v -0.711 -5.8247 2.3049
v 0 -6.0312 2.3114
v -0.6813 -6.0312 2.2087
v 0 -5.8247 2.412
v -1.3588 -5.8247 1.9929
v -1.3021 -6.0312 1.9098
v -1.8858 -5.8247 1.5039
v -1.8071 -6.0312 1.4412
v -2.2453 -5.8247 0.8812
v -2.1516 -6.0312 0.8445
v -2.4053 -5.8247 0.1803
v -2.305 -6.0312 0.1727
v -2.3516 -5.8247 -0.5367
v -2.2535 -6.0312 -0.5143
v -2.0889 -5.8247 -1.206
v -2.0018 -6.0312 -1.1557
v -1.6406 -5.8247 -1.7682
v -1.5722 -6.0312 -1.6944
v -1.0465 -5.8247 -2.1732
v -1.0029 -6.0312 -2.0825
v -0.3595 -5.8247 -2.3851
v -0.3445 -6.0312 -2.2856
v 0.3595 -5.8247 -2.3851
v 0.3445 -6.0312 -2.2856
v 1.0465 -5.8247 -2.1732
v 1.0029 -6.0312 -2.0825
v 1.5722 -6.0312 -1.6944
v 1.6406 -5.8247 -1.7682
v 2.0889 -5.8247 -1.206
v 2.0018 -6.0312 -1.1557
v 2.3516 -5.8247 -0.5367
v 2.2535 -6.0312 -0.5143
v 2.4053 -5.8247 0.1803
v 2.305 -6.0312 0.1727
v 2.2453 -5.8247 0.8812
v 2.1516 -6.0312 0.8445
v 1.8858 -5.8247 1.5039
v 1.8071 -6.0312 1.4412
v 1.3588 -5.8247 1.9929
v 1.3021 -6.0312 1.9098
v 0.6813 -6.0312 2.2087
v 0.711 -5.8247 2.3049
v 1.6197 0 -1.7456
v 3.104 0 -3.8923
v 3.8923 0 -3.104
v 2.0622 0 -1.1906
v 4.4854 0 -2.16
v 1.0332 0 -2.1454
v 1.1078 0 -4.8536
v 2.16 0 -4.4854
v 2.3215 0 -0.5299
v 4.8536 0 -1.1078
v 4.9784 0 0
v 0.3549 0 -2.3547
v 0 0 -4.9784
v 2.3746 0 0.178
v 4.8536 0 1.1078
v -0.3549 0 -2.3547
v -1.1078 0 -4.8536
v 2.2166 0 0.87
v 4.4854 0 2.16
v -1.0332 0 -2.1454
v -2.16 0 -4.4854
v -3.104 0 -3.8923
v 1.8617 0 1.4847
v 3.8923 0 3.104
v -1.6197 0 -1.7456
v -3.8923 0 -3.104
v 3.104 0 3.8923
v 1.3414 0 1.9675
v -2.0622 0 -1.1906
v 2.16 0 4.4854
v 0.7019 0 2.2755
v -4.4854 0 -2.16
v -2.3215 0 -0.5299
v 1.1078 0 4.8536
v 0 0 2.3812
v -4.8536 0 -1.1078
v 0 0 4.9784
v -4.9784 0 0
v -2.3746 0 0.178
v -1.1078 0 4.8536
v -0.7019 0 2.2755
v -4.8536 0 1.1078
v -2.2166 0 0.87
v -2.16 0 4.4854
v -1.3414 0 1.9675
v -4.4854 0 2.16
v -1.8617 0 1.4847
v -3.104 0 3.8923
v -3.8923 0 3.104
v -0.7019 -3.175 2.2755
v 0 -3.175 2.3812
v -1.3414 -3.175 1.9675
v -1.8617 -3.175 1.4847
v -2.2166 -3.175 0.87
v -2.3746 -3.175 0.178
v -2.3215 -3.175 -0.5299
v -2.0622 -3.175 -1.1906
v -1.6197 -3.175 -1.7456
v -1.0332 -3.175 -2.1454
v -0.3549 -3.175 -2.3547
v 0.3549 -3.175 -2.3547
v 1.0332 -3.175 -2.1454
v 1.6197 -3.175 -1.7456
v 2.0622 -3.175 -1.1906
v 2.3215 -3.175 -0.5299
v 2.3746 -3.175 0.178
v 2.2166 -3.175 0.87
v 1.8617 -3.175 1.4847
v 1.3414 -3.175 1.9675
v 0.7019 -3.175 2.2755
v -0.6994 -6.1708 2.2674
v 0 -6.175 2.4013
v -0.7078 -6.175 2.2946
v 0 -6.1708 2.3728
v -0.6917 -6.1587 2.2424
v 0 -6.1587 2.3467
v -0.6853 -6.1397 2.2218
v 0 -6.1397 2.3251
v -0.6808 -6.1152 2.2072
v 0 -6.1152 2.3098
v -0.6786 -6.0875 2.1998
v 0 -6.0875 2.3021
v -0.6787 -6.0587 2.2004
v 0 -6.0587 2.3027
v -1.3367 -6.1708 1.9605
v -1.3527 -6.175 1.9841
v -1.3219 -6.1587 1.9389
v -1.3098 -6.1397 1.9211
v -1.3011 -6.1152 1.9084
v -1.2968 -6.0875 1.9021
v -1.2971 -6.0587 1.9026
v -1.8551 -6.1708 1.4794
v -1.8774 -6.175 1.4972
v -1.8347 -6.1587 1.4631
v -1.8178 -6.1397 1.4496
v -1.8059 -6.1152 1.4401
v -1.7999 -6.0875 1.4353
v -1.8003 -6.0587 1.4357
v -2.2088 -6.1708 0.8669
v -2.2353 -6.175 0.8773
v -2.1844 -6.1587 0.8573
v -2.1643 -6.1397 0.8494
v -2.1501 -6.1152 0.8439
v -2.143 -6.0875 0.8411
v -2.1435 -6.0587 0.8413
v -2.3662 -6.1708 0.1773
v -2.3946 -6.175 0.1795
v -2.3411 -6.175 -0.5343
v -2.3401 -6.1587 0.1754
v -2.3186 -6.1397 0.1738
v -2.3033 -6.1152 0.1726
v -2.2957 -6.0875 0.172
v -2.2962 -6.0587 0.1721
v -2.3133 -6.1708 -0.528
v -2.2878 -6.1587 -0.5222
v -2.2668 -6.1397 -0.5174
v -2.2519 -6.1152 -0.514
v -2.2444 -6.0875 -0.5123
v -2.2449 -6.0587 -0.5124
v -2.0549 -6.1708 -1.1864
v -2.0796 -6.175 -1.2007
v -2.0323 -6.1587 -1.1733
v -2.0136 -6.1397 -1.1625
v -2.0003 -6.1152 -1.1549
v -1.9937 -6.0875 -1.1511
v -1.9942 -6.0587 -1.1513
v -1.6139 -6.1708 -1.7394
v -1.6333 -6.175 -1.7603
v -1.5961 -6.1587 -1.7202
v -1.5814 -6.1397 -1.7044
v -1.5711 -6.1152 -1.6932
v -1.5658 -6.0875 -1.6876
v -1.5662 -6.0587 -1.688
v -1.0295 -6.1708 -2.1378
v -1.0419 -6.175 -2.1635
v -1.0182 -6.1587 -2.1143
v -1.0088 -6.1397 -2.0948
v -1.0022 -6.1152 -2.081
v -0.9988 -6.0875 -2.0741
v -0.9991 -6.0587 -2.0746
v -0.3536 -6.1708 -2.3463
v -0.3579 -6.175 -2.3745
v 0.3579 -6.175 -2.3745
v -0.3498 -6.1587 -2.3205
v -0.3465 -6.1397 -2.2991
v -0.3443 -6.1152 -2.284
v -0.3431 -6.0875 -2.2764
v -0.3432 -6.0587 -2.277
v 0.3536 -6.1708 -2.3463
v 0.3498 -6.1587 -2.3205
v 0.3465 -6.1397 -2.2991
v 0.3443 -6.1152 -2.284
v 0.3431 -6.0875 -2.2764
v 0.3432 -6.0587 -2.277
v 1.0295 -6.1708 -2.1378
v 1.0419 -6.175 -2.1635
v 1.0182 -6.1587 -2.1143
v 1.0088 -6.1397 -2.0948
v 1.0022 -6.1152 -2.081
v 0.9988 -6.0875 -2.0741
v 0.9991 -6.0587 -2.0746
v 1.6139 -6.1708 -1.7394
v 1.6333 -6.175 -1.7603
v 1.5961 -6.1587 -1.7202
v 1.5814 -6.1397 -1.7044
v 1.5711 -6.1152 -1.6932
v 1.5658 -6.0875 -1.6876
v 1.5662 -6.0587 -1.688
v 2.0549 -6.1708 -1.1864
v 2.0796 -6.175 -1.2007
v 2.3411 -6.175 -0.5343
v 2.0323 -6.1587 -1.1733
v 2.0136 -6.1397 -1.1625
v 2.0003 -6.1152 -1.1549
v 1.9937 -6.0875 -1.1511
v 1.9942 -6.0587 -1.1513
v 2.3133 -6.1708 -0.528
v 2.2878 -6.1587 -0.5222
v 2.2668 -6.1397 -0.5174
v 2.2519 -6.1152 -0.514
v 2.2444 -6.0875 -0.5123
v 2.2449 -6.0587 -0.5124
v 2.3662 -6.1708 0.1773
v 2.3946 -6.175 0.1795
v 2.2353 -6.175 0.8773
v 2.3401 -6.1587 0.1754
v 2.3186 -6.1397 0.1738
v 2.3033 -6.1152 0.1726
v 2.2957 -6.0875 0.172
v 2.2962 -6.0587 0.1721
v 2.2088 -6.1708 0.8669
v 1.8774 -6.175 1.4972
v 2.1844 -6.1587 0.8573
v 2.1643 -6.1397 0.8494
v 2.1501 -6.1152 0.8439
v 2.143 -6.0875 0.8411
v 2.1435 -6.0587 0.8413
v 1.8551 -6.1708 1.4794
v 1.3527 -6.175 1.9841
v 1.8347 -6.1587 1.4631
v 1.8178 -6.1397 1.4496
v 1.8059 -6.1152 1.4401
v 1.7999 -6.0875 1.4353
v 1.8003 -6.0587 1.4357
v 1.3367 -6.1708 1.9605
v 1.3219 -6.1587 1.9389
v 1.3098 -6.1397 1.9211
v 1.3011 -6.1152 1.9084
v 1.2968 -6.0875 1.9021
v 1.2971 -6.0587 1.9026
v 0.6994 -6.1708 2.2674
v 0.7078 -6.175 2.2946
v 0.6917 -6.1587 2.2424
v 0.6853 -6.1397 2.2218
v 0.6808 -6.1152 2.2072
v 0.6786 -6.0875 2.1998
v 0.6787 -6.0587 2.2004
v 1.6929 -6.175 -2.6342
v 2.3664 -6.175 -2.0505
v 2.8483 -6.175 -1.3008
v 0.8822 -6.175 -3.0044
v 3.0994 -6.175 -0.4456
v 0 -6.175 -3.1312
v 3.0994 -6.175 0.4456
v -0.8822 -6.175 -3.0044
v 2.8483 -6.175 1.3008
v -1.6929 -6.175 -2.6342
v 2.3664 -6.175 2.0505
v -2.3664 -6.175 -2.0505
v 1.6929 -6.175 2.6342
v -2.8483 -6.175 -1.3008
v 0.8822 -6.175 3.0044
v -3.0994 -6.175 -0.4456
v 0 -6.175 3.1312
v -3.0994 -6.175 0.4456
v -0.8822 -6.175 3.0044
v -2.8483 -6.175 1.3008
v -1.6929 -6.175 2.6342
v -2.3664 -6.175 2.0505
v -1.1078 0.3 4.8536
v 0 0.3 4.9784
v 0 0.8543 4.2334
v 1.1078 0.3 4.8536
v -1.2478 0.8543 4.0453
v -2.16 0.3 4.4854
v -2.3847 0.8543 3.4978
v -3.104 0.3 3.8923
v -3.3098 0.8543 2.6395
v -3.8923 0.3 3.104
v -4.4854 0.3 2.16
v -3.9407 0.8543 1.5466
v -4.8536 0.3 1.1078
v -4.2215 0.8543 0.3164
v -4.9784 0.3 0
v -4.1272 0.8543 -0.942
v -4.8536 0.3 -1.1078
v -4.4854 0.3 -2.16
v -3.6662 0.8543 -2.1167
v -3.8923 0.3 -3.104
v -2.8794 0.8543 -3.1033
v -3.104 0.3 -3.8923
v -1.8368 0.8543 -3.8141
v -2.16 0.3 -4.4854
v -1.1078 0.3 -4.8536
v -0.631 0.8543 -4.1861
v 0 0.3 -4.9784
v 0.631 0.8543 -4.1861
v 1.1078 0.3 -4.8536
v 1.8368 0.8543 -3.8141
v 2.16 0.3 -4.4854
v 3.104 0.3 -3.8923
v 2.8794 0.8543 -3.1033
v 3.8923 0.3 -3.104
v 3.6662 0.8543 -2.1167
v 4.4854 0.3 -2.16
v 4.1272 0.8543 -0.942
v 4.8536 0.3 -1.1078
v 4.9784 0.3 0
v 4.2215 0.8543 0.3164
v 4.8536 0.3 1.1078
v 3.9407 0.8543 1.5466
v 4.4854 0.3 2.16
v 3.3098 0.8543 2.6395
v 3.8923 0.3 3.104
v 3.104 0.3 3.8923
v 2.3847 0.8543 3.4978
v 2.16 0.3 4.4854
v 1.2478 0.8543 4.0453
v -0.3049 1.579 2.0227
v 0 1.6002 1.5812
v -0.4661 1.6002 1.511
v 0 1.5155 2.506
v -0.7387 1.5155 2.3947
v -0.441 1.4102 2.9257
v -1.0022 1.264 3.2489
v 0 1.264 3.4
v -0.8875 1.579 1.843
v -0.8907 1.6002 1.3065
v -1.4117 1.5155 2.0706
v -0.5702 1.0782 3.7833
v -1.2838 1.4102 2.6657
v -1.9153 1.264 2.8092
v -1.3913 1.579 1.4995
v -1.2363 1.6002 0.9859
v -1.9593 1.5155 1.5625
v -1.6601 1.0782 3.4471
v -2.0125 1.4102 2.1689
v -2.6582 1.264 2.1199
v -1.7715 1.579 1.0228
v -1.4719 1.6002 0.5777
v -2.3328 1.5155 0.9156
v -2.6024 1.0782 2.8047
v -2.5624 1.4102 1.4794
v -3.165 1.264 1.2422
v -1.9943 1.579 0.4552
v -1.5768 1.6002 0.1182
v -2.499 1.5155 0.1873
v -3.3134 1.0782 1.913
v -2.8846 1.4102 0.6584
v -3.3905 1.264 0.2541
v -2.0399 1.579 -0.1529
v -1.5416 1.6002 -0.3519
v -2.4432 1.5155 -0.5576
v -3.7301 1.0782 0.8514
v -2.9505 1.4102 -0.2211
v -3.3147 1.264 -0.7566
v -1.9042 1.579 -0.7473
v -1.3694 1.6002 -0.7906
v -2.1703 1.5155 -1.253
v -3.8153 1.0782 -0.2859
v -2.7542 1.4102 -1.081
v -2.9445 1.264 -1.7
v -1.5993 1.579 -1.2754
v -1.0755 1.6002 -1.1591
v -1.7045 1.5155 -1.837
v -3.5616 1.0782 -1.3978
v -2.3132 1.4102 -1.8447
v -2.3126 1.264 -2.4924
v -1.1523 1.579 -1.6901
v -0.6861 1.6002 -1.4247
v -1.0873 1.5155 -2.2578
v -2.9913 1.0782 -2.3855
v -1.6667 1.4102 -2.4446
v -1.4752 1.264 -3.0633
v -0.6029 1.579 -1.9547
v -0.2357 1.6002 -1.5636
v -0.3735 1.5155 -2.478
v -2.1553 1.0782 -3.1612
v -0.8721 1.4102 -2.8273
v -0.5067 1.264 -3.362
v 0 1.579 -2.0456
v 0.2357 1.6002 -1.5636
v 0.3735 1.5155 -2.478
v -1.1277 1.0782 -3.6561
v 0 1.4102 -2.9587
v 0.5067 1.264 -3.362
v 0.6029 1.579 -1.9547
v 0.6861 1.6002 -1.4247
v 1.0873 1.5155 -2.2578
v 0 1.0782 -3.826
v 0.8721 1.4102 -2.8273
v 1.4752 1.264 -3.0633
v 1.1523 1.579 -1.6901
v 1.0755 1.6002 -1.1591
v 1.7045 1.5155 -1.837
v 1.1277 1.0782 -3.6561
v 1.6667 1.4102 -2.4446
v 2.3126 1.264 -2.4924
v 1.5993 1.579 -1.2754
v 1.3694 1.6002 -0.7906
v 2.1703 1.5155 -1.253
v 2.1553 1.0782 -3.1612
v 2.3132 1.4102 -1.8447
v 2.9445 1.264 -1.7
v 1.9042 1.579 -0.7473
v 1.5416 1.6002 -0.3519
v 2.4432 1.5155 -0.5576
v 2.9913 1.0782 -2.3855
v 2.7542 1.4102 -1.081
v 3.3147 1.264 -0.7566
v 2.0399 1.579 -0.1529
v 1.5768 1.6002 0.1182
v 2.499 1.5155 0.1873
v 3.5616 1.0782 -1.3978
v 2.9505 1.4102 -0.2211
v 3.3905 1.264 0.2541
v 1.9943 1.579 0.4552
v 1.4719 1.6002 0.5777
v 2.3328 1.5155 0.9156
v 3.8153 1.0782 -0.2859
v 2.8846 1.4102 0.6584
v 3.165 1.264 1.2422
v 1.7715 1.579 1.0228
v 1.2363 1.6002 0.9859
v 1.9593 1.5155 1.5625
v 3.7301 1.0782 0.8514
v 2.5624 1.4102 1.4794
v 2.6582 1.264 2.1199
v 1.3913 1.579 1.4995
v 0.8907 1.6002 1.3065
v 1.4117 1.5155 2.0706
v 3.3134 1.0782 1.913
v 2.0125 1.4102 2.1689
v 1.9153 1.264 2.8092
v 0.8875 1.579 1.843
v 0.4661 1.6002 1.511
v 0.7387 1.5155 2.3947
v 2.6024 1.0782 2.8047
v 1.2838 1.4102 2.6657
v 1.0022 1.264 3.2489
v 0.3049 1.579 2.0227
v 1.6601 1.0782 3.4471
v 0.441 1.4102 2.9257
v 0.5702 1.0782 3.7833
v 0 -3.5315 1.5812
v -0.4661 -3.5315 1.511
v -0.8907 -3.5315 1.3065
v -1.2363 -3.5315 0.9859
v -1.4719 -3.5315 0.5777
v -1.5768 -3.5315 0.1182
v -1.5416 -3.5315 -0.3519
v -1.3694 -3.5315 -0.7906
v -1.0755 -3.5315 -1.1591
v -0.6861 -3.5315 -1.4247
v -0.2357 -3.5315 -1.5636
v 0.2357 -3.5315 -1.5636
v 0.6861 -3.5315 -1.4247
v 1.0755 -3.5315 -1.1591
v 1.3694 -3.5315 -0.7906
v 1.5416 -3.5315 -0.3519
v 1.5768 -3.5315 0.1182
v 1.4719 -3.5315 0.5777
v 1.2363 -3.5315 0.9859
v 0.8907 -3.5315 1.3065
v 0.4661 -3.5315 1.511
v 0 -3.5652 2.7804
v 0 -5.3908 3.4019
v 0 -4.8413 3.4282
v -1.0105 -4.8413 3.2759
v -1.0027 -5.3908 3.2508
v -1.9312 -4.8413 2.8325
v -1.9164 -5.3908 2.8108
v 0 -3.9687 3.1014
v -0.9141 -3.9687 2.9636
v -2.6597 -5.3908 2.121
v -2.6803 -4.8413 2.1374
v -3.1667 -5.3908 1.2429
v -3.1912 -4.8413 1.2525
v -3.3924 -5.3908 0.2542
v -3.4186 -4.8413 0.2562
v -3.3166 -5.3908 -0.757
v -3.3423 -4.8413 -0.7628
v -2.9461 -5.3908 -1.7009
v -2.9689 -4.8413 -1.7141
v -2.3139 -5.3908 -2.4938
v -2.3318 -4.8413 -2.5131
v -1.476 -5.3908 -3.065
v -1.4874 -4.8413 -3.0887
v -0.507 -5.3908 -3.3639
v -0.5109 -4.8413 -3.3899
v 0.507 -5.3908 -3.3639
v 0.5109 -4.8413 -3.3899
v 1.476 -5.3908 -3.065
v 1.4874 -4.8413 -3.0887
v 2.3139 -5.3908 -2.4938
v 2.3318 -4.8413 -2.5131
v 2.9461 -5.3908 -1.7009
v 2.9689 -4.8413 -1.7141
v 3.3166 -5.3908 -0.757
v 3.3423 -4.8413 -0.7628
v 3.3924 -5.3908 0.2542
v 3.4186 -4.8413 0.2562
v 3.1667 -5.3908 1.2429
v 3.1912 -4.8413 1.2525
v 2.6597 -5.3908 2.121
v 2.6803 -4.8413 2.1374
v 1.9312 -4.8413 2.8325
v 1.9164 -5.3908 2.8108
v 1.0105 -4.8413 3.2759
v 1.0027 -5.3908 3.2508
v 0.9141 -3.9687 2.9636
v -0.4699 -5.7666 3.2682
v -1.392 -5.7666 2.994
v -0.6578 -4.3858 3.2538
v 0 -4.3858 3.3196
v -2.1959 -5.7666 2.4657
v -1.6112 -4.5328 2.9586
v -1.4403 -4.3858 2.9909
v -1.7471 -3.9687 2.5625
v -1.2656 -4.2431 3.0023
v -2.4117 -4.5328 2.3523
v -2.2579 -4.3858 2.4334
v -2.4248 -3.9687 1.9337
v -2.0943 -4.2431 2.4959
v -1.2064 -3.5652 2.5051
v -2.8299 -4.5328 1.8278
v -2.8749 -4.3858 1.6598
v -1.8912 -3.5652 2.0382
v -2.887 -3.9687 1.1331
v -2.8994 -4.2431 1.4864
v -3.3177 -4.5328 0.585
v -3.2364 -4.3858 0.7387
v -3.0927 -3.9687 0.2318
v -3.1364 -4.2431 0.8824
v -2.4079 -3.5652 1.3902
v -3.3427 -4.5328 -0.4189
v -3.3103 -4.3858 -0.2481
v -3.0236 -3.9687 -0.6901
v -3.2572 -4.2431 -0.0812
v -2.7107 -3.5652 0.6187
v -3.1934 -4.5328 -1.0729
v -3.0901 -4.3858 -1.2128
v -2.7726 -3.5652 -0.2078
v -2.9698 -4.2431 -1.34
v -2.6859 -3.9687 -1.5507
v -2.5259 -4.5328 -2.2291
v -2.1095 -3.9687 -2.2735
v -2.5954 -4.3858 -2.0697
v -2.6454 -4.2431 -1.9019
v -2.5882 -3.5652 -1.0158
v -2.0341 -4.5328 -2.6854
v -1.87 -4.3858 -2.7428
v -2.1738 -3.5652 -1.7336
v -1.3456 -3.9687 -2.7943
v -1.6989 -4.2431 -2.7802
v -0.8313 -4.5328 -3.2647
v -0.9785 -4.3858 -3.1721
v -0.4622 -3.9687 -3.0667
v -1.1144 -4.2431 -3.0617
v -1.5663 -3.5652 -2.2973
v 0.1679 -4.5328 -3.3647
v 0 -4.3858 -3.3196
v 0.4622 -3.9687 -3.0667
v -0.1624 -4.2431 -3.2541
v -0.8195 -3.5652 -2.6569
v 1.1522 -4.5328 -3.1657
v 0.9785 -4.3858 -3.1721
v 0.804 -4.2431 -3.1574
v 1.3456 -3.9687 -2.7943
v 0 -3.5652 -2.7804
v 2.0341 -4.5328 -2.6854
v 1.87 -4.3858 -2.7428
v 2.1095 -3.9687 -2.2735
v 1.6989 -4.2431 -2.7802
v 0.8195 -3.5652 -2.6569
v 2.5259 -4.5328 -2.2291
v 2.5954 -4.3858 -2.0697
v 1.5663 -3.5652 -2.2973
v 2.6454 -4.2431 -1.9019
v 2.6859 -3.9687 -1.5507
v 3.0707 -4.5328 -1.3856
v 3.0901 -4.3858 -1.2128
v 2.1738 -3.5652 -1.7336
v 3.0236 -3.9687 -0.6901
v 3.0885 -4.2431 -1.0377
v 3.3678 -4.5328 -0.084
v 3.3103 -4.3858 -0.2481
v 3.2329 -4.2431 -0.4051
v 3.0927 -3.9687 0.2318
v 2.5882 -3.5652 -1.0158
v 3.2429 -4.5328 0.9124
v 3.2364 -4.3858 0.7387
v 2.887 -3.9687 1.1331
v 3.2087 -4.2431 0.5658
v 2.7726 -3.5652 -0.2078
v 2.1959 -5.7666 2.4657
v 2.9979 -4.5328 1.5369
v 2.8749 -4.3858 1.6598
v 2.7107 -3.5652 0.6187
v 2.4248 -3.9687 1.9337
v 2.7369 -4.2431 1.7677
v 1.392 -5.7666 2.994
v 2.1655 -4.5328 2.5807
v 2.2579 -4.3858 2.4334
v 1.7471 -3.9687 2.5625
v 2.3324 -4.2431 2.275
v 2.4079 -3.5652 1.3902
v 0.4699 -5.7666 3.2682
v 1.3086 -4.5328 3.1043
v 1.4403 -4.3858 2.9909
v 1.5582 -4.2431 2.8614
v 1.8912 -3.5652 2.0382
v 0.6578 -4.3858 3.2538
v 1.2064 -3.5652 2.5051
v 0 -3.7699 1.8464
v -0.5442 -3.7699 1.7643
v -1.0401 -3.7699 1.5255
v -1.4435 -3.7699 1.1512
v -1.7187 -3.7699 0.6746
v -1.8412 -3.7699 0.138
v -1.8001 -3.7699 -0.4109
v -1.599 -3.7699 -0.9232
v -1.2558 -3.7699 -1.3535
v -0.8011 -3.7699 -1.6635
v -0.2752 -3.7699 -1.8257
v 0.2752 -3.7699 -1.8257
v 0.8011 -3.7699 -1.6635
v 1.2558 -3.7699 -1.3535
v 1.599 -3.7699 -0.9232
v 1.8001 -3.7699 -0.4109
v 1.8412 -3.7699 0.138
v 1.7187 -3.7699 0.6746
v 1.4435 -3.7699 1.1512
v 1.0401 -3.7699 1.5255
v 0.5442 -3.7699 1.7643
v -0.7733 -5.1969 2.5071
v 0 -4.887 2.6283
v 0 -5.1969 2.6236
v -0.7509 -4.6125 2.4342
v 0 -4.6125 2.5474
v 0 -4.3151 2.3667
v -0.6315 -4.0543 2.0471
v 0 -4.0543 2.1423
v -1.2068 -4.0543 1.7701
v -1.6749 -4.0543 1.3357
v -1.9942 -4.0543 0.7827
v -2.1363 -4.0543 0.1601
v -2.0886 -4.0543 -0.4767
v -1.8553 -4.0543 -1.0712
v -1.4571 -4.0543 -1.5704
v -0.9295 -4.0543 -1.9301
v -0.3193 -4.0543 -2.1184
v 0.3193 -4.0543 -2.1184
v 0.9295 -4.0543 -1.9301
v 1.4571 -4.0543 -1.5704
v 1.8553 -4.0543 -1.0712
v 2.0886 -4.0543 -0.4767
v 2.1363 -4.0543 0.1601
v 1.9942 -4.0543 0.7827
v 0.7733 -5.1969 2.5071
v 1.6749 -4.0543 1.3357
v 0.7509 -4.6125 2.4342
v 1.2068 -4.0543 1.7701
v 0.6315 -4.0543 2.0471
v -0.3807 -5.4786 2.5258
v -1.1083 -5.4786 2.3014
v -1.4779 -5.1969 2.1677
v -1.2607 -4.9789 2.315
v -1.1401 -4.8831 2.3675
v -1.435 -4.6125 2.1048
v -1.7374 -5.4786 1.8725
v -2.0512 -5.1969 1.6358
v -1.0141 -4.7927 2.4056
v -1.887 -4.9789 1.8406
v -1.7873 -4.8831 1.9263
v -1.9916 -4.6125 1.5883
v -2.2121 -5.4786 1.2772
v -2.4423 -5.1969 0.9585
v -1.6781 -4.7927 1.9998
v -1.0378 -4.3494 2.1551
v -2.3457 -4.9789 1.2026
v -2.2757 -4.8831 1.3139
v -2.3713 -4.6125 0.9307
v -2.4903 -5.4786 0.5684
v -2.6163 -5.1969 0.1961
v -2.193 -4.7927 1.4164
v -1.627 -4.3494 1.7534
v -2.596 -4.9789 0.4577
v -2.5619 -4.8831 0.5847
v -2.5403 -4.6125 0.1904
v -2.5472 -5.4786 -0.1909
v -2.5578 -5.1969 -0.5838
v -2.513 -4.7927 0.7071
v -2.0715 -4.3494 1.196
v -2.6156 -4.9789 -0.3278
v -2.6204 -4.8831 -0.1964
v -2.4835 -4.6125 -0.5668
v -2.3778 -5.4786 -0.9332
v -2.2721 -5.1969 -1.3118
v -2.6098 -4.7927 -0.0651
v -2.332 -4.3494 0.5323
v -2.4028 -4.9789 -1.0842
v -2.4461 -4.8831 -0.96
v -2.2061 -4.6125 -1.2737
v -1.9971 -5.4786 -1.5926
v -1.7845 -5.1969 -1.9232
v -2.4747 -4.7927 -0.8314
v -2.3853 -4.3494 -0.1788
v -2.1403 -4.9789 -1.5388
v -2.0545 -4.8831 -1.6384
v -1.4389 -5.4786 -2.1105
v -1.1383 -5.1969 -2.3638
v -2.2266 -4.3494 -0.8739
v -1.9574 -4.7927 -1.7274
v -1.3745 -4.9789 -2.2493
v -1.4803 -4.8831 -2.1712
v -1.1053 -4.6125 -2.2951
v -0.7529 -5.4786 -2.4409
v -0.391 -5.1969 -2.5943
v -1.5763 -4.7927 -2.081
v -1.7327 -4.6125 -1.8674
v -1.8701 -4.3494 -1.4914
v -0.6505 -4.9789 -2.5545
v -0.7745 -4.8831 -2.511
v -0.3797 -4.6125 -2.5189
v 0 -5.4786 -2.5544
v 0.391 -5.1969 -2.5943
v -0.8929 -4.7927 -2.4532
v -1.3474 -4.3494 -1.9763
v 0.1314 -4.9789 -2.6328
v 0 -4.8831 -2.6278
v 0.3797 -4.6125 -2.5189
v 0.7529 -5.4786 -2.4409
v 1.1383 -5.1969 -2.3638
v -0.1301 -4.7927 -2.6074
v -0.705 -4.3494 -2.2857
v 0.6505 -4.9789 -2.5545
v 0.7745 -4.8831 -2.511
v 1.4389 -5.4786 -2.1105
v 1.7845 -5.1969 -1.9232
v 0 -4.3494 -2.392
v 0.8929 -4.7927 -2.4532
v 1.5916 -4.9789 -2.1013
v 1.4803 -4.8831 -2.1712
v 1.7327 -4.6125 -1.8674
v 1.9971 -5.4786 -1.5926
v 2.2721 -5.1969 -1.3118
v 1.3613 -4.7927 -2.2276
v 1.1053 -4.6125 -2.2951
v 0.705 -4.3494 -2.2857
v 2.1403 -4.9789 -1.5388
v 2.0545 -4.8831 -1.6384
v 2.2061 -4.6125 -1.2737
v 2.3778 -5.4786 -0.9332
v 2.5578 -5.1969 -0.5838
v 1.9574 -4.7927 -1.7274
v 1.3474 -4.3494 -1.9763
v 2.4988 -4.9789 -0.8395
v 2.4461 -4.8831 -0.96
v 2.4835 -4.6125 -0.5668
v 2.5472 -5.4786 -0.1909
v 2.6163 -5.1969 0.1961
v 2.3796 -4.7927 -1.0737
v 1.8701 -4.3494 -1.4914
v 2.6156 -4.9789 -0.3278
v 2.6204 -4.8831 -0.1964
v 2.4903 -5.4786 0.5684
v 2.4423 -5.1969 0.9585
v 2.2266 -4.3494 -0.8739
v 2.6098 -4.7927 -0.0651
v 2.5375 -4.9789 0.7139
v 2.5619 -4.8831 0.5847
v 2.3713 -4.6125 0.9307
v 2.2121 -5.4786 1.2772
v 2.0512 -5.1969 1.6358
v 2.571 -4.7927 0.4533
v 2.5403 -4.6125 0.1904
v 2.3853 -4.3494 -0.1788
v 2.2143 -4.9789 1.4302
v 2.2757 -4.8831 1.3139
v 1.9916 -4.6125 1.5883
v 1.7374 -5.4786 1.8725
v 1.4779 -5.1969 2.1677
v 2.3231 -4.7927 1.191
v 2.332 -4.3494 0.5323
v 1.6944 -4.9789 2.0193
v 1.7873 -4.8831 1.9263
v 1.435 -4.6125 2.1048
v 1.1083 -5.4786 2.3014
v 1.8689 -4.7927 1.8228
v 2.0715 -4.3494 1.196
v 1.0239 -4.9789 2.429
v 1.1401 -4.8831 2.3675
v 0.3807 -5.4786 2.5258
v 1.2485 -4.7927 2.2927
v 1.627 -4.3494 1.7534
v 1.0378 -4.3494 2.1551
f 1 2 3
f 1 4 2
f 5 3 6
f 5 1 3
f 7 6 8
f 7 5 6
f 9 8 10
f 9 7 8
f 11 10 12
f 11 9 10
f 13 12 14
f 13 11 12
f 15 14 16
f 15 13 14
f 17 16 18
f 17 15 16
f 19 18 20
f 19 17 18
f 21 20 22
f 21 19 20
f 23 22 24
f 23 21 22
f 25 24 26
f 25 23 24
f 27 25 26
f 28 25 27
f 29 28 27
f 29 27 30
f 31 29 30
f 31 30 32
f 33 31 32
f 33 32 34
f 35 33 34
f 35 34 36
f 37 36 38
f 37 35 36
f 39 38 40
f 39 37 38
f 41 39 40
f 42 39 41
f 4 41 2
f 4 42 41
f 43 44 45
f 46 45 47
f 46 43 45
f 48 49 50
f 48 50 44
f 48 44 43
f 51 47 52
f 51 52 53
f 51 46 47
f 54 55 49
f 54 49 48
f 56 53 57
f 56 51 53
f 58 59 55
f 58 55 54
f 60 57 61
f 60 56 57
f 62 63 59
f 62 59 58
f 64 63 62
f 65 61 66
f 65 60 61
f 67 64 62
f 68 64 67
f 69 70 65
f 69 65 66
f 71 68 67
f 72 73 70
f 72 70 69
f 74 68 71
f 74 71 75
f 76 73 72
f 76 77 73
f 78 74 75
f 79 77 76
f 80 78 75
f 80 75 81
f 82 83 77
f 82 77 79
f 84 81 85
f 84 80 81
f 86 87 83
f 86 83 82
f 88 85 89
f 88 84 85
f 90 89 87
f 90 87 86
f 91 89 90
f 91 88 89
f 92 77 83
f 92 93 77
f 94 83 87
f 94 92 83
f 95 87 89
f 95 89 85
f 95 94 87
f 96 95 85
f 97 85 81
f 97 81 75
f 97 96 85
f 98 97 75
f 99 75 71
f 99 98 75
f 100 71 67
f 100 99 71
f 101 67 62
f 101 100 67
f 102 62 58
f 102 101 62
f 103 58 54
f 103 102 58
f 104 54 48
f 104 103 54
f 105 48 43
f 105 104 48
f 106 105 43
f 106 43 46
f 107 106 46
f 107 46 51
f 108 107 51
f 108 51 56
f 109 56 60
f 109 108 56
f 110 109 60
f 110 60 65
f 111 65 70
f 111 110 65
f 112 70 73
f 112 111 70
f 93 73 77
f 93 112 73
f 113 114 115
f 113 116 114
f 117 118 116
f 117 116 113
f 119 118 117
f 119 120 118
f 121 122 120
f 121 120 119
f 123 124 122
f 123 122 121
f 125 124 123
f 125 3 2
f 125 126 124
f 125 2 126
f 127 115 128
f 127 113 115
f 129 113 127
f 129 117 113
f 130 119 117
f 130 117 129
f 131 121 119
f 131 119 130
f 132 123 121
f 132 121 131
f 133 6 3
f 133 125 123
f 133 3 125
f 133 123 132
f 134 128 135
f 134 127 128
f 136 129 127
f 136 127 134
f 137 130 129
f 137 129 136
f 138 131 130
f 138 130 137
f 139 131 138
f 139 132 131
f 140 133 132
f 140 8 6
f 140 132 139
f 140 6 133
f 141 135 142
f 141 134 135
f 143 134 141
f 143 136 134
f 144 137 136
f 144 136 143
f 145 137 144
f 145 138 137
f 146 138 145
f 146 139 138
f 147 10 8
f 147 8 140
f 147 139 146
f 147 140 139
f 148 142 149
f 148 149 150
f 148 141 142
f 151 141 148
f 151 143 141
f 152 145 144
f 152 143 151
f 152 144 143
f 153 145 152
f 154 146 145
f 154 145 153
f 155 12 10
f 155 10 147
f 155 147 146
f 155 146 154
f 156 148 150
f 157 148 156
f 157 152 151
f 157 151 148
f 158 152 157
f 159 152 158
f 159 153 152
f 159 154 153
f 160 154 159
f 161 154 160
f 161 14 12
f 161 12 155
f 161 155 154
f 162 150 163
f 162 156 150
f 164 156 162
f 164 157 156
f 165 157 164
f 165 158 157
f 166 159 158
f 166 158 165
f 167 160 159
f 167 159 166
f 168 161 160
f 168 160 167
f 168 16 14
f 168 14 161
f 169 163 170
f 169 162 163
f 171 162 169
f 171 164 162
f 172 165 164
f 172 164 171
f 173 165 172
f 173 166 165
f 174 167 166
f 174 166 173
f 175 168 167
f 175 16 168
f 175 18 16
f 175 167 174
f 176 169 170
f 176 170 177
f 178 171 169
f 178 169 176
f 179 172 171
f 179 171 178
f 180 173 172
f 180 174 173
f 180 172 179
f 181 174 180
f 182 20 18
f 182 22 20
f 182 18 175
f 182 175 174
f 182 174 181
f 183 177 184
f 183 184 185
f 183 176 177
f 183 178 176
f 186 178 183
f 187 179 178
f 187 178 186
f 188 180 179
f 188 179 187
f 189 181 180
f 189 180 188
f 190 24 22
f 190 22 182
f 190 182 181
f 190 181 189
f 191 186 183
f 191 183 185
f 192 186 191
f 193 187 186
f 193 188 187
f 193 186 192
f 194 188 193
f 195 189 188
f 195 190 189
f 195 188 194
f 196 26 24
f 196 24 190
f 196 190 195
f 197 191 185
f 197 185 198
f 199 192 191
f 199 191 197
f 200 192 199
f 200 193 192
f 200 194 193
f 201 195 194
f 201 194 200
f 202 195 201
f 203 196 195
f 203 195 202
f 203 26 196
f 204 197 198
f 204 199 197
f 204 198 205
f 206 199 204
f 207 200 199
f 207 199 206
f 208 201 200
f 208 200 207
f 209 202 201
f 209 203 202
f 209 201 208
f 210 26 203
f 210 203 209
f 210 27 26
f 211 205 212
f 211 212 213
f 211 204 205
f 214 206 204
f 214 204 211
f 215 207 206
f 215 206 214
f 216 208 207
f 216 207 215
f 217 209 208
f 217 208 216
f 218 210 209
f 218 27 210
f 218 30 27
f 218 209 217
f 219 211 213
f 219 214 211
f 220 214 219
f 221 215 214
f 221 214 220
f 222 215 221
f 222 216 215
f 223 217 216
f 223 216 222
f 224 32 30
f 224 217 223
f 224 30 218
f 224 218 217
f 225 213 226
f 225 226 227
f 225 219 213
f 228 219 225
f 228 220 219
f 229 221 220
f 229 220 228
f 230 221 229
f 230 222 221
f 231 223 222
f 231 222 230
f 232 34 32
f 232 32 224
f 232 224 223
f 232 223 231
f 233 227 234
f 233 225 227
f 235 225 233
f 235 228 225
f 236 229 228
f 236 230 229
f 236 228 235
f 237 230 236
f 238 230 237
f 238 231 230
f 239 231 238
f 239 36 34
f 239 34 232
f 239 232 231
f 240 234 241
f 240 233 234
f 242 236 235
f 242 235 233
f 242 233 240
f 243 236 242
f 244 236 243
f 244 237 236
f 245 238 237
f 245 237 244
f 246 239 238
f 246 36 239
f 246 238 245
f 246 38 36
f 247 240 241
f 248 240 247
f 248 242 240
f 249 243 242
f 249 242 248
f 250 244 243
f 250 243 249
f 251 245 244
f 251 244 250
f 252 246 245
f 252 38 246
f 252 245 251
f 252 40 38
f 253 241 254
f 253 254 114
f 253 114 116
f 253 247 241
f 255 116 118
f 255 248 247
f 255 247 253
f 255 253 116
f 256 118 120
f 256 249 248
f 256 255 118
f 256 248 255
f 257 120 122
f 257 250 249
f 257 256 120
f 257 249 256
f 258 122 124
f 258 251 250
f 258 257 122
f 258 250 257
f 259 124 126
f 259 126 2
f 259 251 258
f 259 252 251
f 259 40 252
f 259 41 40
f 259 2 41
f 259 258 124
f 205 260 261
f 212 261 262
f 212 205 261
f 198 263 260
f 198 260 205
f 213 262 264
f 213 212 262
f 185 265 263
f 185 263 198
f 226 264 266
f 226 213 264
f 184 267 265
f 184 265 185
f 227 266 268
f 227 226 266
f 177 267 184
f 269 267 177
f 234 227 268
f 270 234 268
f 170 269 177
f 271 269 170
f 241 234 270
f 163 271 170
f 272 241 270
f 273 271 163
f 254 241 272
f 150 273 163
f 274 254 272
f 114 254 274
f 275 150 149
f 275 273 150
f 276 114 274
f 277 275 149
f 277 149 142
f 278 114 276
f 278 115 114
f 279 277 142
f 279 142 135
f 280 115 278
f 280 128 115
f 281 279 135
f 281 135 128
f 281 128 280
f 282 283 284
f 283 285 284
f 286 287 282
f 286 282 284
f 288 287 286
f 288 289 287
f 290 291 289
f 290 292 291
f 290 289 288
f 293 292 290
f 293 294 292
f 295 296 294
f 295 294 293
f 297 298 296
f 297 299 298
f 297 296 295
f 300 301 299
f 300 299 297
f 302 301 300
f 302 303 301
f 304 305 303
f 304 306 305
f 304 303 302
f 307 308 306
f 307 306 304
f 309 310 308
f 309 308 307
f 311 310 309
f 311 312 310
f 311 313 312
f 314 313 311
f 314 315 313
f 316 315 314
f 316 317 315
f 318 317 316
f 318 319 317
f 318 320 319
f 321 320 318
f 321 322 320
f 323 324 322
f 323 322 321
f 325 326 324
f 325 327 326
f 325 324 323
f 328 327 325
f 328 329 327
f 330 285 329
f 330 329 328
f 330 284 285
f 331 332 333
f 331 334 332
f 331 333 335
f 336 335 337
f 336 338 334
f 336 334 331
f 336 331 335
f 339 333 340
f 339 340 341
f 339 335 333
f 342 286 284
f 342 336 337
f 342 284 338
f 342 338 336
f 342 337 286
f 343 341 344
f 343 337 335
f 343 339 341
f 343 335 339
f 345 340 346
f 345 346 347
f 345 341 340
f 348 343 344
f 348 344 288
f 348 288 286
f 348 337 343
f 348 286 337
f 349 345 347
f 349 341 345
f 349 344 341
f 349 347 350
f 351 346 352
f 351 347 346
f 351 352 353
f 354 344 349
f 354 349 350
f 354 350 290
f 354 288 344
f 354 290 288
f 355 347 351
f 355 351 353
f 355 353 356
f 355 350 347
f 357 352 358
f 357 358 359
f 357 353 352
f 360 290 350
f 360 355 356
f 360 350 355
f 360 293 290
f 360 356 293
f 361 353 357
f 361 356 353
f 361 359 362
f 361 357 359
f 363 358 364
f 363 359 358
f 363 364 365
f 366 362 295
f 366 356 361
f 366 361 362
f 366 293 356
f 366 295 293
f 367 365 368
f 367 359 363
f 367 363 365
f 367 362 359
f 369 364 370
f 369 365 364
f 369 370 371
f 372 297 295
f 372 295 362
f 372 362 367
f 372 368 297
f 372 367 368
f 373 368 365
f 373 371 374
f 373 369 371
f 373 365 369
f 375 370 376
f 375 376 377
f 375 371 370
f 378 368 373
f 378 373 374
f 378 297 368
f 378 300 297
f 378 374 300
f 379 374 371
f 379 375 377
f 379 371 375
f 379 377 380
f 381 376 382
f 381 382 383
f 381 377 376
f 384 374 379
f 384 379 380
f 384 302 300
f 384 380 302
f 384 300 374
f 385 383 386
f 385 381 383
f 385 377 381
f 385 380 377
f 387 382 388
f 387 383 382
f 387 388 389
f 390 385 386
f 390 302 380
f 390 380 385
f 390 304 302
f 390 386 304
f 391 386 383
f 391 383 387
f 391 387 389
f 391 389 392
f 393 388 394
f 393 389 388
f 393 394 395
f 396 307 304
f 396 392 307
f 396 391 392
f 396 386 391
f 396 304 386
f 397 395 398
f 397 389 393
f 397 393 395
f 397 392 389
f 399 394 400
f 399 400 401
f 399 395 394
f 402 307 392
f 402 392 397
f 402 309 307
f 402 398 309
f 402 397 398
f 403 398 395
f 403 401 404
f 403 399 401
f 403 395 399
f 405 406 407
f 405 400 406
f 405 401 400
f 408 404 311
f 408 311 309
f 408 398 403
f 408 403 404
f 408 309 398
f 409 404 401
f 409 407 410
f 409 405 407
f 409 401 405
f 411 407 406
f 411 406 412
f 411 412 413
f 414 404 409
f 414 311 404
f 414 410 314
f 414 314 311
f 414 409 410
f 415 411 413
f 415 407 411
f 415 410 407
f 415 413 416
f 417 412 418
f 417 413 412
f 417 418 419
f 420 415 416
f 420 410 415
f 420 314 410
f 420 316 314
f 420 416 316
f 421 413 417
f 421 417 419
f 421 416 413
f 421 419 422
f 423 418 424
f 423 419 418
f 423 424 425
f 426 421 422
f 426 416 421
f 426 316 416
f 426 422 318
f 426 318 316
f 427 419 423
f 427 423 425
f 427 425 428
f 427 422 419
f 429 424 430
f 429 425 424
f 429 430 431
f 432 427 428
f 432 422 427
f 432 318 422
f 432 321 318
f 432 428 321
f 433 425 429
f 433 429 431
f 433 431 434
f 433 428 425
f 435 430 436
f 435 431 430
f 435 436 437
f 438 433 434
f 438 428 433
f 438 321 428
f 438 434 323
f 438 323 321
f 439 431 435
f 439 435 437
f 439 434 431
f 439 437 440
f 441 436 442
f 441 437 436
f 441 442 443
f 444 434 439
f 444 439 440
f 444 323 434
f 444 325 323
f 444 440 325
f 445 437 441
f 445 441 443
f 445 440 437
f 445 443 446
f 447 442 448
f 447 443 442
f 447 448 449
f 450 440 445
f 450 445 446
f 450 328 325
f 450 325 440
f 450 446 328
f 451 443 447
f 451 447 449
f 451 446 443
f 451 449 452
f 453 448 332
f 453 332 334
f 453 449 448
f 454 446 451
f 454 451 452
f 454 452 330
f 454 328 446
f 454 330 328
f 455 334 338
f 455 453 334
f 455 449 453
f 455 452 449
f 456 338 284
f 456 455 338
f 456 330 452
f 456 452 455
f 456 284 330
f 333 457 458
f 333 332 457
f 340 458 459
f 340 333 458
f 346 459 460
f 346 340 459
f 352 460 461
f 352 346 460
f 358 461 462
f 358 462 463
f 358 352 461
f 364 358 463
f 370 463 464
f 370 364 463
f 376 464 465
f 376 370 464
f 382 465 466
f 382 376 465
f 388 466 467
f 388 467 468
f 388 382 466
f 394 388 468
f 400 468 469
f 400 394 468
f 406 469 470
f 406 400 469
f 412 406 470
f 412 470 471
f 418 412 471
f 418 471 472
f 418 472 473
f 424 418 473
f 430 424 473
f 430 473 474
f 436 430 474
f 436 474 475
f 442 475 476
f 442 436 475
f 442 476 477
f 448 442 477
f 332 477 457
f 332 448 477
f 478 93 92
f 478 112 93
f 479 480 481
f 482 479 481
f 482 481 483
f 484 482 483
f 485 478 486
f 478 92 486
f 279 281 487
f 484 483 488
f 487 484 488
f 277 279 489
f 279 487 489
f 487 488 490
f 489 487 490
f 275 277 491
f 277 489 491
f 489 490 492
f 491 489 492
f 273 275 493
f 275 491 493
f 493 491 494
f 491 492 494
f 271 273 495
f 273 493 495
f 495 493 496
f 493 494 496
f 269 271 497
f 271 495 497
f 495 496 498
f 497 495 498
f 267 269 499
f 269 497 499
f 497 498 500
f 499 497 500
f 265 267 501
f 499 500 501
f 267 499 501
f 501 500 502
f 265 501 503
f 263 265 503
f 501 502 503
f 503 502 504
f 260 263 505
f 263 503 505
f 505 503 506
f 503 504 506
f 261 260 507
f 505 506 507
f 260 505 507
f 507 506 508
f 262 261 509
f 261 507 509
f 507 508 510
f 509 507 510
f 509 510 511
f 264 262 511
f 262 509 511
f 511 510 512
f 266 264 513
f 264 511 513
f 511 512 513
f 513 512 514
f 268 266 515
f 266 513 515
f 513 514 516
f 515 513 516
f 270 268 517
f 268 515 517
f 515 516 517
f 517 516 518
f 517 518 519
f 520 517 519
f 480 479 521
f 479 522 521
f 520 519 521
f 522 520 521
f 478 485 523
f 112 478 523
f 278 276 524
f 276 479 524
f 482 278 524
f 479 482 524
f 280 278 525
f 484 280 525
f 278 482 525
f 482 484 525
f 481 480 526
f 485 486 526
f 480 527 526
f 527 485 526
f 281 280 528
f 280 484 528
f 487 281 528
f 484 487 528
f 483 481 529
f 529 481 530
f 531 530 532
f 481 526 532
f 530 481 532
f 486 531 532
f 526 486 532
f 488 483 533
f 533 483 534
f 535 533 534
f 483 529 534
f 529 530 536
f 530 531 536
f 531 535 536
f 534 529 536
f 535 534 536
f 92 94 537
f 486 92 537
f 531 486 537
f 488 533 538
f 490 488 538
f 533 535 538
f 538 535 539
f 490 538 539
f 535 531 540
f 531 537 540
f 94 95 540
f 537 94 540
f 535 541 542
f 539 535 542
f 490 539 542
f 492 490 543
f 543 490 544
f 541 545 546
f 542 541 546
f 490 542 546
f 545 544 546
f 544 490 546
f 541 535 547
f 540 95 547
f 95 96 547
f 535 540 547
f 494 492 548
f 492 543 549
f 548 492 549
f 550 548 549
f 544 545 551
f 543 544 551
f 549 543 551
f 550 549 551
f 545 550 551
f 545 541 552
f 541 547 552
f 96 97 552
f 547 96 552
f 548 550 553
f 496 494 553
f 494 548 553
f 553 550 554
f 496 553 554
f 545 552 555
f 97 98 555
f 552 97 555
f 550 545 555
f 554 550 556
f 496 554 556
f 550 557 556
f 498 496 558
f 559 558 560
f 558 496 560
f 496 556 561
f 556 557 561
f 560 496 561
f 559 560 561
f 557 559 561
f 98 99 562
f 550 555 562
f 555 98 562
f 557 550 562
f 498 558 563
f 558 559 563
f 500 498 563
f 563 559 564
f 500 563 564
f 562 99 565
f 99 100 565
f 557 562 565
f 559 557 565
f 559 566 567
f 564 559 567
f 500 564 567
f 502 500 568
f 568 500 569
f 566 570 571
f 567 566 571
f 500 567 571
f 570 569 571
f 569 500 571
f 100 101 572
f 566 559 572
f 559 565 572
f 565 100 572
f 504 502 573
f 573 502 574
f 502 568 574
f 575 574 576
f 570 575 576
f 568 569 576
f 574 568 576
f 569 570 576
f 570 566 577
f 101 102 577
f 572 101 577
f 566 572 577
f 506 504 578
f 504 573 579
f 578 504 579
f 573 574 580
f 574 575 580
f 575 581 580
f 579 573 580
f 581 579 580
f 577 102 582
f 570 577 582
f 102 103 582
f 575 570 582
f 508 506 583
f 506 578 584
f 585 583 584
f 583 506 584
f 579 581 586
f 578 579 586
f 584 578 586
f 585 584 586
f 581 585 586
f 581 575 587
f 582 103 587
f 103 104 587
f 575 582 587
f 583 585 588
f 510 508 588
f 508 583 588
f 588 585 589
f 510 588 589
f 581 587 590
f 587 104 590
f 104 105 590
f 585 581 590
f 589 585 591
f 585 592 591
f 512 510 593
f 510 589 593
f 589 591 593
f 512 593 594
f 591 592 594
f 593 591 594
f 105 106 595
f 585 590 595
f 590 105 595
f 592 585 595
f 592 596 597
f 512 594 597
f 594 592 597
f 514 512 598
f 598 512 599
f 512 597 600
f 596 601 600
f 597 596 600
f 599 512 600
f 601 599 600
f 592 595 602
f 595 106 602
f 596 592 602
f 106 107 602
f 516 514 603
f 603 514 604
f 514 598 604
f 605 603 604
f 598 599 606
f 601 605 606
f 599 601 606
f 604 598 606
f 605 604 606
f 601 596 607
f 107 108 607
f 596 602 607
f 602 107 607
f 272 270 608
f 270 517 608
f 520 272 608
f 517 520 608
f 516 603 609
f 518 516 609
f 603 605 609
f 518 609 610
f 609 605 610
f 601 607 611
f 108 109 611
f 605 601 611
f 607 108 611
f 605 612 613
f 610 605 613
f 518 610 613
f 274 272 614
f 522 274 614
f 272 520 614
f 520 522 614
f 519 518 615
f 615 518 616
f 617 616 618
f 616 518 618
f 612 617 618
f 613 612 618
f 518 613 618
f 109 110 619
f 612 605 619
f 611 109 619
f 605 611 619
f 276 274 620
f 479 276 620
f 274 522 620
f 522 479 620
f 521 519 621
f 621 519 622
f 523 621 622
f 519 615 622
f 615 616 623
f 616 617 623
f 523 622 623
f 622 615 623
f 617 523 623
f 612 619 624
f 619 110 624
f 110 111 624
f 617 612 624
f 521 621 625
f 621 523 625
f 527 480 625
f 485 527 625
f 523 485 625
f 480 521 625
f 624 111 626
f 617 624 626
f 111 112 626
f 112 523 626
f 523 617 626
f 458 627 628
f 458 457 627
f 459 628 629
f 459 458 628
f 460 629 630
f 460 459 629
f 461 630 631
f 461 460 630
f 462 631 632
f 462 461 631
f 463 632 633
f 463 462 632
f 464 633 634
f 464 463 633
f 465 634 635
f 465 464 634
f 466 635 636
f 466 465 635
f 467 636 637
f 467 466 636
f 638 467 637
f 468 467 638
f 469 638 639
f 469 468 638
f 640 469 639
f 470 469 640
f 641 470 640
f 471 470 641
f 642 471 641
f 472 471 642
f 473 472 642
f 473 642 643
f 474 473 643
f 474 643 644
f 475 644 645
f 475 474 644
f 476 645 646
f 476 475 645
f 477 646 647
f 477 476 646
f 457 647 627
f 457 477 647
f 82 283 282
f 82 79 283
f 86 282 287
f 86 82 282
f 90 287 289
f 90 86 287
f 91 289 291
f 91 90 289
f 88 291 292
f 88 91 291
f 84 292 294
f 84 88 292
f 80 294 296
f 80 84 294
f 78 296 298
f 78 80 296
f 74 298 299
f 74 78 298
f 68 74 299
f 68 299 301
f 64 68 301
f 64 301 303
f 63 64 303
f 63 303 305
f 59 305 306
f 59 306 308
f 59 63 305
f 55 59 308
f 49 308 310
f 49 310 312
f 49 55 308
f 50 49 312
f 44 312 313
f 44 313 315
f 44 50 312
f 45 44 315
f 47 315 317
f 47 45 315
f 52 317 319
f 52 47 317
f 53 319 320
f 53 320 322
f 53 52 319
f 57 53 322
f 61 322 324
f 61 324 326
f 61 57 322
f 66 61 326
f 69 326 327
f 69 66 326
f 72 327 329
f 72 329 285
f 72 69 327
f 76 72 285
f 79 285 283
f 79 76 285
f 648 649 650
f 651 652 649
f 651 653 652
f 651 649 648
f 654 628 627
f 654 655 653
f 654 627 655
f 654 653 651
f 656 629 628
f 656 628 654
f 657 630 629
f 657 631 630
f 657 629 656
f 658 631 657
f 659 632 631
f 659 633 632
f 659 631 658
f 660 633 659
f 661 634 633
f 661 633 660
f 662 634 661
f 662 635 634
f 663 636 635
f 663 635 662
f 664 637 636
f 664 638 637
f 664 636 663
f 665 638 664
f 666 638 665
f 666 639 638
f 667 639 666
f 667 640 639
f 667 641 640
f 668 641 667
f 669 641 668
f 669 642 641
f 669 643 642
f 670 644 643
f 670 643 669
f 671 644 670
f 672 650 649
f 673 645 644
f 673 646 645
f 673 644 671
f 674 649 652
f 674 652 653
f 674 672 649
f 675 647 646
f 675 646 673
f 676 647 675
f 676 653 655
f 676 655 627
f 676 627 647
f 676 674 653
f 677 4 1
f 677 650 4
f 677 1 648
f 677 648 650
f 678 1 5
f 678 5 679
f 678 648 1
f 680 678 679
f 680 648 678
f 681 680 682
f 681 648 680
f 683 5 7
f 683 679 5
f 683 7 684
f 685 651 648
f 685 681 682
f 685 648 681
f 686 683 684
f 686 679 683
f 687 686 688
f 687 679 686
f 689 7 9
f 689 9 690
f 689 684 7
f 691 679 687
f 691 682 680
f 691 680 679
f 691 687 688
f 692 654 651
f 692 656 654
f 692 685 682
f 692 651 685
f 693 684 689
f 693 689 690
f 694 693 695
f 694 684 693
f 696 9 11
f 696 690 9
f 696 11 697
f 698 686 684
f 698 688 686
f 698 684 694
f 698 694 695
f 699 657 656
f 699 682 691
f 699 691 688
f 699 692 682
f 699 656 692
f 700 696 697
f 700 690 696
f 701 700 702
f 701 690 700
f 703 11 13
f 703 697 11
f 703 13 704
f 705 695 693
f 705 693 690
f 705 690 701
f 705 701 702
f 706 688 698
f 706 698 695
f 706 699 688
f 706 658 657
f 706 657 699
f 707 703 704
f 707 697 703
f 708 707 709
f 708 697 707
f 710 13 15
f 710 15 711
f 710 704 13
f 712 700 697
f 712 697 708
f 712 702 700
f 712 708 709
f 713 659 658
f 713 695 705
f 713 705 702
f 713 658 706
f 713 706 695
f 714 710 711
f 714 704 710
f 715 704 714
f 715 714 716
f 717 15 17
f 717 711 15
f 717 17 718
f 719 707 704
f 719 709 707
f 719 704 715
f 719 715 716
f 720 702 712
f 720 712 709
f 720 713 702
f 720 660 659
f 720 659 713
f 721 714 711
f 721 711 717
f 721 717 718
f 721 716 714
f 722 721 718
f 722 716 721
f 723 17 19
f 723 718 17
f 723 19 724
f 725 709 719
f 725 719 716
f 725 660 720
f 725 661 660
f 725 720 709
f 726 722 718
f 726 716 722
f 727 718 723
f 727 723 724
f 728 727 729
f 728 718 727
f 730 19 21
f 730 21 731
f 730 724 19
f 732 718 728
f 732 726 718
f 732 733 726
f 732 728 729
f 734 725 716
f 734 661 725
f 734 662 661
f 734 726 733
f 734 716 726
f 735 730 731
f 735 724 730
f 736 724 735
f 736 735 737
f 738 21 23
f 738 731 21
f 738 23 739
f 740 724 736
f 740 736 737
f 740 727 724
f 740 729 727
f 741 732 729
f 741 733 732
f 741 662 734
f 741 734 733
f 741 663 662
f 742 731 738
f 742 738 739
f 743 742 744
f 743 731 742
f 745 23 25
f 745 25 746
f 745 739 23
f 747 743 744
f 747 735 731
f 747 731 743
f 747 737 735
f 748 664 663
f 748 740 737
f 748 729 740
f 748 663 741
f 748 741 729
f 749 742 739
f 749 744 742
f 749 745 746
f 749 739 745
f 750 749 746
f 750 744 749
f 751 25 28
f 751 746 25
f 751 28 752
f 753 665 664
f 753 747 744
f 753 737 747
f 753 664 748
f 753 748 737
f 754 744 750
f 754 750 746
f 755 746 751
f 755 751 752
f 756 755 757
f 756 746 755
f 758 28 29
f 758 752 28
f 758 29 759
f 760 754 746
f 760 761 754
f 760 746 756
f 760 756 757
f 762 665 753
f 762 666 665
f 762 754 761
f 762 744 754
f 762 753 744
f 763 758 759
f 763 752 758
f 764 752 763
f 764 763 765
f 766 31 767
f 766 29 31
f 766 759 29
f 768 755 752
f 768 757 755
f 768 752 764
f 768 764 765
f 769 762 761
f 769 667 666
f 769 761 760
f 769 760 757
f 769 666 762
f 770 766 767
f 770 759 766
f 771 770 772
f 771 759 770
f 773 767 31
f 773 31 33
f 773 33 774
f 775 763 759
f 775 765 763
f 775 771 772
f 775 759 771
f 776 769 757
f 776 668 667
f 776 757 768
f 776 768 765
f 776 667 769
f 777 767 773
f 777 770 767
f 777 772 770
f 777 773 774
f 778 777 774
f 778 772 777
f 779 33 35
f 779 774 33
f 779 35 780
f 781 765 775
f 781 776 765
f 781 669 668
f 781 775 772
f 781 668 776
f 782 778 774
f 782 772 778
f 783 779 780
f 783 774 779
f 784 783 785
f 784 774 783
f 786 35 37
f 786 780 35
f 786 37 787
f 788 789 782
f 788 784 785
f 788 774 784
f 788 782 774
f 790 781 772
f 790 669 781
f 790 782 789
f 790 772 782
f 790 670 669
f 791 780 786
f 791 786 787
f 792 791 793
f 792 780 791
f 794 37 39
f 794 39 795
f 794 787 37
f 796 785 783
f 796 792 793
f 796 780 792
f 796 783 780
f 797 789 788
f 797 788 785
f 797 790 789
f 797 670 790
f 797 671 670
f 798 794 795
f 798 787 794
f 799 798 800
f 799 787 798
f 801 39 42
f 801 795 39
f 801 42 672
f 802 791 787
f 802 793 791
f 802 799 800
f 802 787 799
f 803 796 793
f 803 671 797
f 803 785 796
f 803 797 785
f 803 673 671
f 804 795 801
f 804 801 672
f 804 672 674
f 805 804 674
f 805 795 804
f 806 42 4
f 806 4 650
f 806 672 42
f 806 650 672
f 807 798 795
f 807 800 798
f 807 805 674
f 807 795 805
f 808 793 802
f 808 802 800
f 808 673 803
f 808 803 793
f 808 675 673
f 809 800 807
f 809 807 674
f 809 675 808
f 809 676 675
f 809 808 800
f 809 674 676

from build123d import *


with BuildPart() as part:
    # Sketch1 → Revolve1 (revolve)
    with BuildSketch(Plane(origin=(0, 0, 0), x_dir=(0, 0, -1), z_dir=(1, 0, 0))):
        with BuildLine():
            Line((-2.38125, 0), (-2.38125, -3.175))
            add(Edge.make_bspline(
                [(-3.13125, -6.175), (-3.802952342, -4.79609431), (-3.285209116, -3.987769359), (-2.38125, -3.175)],
                knots=[0, 0, 0, 0, 0.915818095, 0.915818095, 0.915818095, 0.915818095], degree=3))
            Line((-3.13125, -6.175), (-2.401327057, -6.175))
            ThreePointArc((-2.401327057, -6.175), (-2.316535213, -6.12801267), (-2.311426216, -6.031206863))
            Line((-2.311426216, -6.031206863), (-2.412043273, -5.824654907))
            add(Edge.make_bspline(
                [(-2.412043273, -5.824654907), (-2.471633315, -5.702325353), (-2.583928673, -5.423792478), (-2.638657915, -5.140257692), (-2.638916412, -4.911036675), (-2.582141845, -4.65282889), (-2.426240405, -4.370567896), (-2.139321349, -4.043102642), (-1.942255168, -3.85611024), (-1.846366913, -3.769895018)],
                knots=[0, 0, 0, 0, 0.114477262, 0.228954524, 0.343431786, 0.457909047, 0.686863571, 0.801340833, 0.915818095, 0.915818095, 0.915818095, 0.915818095], degree=3))
            Line((-1.846366913, -3.769895018), (-1.58125, -3.531522619))
            Line((-1.58125, -3.531522619), (-1.58125, 1.6002))
            ThreePointArc((-1.58125, 1.6002), (-3.399982262, 1.264045733), (-4.9784, 0.3))
            Line((-4.9784, 0.3), (-4.9784, 0))
            Line((-4.9784, 0), (-2.38125, 0))
        make_face()
    revolve(axis=Axis((0, 0, 0), (0, -1, 0)))


solid = part.part
